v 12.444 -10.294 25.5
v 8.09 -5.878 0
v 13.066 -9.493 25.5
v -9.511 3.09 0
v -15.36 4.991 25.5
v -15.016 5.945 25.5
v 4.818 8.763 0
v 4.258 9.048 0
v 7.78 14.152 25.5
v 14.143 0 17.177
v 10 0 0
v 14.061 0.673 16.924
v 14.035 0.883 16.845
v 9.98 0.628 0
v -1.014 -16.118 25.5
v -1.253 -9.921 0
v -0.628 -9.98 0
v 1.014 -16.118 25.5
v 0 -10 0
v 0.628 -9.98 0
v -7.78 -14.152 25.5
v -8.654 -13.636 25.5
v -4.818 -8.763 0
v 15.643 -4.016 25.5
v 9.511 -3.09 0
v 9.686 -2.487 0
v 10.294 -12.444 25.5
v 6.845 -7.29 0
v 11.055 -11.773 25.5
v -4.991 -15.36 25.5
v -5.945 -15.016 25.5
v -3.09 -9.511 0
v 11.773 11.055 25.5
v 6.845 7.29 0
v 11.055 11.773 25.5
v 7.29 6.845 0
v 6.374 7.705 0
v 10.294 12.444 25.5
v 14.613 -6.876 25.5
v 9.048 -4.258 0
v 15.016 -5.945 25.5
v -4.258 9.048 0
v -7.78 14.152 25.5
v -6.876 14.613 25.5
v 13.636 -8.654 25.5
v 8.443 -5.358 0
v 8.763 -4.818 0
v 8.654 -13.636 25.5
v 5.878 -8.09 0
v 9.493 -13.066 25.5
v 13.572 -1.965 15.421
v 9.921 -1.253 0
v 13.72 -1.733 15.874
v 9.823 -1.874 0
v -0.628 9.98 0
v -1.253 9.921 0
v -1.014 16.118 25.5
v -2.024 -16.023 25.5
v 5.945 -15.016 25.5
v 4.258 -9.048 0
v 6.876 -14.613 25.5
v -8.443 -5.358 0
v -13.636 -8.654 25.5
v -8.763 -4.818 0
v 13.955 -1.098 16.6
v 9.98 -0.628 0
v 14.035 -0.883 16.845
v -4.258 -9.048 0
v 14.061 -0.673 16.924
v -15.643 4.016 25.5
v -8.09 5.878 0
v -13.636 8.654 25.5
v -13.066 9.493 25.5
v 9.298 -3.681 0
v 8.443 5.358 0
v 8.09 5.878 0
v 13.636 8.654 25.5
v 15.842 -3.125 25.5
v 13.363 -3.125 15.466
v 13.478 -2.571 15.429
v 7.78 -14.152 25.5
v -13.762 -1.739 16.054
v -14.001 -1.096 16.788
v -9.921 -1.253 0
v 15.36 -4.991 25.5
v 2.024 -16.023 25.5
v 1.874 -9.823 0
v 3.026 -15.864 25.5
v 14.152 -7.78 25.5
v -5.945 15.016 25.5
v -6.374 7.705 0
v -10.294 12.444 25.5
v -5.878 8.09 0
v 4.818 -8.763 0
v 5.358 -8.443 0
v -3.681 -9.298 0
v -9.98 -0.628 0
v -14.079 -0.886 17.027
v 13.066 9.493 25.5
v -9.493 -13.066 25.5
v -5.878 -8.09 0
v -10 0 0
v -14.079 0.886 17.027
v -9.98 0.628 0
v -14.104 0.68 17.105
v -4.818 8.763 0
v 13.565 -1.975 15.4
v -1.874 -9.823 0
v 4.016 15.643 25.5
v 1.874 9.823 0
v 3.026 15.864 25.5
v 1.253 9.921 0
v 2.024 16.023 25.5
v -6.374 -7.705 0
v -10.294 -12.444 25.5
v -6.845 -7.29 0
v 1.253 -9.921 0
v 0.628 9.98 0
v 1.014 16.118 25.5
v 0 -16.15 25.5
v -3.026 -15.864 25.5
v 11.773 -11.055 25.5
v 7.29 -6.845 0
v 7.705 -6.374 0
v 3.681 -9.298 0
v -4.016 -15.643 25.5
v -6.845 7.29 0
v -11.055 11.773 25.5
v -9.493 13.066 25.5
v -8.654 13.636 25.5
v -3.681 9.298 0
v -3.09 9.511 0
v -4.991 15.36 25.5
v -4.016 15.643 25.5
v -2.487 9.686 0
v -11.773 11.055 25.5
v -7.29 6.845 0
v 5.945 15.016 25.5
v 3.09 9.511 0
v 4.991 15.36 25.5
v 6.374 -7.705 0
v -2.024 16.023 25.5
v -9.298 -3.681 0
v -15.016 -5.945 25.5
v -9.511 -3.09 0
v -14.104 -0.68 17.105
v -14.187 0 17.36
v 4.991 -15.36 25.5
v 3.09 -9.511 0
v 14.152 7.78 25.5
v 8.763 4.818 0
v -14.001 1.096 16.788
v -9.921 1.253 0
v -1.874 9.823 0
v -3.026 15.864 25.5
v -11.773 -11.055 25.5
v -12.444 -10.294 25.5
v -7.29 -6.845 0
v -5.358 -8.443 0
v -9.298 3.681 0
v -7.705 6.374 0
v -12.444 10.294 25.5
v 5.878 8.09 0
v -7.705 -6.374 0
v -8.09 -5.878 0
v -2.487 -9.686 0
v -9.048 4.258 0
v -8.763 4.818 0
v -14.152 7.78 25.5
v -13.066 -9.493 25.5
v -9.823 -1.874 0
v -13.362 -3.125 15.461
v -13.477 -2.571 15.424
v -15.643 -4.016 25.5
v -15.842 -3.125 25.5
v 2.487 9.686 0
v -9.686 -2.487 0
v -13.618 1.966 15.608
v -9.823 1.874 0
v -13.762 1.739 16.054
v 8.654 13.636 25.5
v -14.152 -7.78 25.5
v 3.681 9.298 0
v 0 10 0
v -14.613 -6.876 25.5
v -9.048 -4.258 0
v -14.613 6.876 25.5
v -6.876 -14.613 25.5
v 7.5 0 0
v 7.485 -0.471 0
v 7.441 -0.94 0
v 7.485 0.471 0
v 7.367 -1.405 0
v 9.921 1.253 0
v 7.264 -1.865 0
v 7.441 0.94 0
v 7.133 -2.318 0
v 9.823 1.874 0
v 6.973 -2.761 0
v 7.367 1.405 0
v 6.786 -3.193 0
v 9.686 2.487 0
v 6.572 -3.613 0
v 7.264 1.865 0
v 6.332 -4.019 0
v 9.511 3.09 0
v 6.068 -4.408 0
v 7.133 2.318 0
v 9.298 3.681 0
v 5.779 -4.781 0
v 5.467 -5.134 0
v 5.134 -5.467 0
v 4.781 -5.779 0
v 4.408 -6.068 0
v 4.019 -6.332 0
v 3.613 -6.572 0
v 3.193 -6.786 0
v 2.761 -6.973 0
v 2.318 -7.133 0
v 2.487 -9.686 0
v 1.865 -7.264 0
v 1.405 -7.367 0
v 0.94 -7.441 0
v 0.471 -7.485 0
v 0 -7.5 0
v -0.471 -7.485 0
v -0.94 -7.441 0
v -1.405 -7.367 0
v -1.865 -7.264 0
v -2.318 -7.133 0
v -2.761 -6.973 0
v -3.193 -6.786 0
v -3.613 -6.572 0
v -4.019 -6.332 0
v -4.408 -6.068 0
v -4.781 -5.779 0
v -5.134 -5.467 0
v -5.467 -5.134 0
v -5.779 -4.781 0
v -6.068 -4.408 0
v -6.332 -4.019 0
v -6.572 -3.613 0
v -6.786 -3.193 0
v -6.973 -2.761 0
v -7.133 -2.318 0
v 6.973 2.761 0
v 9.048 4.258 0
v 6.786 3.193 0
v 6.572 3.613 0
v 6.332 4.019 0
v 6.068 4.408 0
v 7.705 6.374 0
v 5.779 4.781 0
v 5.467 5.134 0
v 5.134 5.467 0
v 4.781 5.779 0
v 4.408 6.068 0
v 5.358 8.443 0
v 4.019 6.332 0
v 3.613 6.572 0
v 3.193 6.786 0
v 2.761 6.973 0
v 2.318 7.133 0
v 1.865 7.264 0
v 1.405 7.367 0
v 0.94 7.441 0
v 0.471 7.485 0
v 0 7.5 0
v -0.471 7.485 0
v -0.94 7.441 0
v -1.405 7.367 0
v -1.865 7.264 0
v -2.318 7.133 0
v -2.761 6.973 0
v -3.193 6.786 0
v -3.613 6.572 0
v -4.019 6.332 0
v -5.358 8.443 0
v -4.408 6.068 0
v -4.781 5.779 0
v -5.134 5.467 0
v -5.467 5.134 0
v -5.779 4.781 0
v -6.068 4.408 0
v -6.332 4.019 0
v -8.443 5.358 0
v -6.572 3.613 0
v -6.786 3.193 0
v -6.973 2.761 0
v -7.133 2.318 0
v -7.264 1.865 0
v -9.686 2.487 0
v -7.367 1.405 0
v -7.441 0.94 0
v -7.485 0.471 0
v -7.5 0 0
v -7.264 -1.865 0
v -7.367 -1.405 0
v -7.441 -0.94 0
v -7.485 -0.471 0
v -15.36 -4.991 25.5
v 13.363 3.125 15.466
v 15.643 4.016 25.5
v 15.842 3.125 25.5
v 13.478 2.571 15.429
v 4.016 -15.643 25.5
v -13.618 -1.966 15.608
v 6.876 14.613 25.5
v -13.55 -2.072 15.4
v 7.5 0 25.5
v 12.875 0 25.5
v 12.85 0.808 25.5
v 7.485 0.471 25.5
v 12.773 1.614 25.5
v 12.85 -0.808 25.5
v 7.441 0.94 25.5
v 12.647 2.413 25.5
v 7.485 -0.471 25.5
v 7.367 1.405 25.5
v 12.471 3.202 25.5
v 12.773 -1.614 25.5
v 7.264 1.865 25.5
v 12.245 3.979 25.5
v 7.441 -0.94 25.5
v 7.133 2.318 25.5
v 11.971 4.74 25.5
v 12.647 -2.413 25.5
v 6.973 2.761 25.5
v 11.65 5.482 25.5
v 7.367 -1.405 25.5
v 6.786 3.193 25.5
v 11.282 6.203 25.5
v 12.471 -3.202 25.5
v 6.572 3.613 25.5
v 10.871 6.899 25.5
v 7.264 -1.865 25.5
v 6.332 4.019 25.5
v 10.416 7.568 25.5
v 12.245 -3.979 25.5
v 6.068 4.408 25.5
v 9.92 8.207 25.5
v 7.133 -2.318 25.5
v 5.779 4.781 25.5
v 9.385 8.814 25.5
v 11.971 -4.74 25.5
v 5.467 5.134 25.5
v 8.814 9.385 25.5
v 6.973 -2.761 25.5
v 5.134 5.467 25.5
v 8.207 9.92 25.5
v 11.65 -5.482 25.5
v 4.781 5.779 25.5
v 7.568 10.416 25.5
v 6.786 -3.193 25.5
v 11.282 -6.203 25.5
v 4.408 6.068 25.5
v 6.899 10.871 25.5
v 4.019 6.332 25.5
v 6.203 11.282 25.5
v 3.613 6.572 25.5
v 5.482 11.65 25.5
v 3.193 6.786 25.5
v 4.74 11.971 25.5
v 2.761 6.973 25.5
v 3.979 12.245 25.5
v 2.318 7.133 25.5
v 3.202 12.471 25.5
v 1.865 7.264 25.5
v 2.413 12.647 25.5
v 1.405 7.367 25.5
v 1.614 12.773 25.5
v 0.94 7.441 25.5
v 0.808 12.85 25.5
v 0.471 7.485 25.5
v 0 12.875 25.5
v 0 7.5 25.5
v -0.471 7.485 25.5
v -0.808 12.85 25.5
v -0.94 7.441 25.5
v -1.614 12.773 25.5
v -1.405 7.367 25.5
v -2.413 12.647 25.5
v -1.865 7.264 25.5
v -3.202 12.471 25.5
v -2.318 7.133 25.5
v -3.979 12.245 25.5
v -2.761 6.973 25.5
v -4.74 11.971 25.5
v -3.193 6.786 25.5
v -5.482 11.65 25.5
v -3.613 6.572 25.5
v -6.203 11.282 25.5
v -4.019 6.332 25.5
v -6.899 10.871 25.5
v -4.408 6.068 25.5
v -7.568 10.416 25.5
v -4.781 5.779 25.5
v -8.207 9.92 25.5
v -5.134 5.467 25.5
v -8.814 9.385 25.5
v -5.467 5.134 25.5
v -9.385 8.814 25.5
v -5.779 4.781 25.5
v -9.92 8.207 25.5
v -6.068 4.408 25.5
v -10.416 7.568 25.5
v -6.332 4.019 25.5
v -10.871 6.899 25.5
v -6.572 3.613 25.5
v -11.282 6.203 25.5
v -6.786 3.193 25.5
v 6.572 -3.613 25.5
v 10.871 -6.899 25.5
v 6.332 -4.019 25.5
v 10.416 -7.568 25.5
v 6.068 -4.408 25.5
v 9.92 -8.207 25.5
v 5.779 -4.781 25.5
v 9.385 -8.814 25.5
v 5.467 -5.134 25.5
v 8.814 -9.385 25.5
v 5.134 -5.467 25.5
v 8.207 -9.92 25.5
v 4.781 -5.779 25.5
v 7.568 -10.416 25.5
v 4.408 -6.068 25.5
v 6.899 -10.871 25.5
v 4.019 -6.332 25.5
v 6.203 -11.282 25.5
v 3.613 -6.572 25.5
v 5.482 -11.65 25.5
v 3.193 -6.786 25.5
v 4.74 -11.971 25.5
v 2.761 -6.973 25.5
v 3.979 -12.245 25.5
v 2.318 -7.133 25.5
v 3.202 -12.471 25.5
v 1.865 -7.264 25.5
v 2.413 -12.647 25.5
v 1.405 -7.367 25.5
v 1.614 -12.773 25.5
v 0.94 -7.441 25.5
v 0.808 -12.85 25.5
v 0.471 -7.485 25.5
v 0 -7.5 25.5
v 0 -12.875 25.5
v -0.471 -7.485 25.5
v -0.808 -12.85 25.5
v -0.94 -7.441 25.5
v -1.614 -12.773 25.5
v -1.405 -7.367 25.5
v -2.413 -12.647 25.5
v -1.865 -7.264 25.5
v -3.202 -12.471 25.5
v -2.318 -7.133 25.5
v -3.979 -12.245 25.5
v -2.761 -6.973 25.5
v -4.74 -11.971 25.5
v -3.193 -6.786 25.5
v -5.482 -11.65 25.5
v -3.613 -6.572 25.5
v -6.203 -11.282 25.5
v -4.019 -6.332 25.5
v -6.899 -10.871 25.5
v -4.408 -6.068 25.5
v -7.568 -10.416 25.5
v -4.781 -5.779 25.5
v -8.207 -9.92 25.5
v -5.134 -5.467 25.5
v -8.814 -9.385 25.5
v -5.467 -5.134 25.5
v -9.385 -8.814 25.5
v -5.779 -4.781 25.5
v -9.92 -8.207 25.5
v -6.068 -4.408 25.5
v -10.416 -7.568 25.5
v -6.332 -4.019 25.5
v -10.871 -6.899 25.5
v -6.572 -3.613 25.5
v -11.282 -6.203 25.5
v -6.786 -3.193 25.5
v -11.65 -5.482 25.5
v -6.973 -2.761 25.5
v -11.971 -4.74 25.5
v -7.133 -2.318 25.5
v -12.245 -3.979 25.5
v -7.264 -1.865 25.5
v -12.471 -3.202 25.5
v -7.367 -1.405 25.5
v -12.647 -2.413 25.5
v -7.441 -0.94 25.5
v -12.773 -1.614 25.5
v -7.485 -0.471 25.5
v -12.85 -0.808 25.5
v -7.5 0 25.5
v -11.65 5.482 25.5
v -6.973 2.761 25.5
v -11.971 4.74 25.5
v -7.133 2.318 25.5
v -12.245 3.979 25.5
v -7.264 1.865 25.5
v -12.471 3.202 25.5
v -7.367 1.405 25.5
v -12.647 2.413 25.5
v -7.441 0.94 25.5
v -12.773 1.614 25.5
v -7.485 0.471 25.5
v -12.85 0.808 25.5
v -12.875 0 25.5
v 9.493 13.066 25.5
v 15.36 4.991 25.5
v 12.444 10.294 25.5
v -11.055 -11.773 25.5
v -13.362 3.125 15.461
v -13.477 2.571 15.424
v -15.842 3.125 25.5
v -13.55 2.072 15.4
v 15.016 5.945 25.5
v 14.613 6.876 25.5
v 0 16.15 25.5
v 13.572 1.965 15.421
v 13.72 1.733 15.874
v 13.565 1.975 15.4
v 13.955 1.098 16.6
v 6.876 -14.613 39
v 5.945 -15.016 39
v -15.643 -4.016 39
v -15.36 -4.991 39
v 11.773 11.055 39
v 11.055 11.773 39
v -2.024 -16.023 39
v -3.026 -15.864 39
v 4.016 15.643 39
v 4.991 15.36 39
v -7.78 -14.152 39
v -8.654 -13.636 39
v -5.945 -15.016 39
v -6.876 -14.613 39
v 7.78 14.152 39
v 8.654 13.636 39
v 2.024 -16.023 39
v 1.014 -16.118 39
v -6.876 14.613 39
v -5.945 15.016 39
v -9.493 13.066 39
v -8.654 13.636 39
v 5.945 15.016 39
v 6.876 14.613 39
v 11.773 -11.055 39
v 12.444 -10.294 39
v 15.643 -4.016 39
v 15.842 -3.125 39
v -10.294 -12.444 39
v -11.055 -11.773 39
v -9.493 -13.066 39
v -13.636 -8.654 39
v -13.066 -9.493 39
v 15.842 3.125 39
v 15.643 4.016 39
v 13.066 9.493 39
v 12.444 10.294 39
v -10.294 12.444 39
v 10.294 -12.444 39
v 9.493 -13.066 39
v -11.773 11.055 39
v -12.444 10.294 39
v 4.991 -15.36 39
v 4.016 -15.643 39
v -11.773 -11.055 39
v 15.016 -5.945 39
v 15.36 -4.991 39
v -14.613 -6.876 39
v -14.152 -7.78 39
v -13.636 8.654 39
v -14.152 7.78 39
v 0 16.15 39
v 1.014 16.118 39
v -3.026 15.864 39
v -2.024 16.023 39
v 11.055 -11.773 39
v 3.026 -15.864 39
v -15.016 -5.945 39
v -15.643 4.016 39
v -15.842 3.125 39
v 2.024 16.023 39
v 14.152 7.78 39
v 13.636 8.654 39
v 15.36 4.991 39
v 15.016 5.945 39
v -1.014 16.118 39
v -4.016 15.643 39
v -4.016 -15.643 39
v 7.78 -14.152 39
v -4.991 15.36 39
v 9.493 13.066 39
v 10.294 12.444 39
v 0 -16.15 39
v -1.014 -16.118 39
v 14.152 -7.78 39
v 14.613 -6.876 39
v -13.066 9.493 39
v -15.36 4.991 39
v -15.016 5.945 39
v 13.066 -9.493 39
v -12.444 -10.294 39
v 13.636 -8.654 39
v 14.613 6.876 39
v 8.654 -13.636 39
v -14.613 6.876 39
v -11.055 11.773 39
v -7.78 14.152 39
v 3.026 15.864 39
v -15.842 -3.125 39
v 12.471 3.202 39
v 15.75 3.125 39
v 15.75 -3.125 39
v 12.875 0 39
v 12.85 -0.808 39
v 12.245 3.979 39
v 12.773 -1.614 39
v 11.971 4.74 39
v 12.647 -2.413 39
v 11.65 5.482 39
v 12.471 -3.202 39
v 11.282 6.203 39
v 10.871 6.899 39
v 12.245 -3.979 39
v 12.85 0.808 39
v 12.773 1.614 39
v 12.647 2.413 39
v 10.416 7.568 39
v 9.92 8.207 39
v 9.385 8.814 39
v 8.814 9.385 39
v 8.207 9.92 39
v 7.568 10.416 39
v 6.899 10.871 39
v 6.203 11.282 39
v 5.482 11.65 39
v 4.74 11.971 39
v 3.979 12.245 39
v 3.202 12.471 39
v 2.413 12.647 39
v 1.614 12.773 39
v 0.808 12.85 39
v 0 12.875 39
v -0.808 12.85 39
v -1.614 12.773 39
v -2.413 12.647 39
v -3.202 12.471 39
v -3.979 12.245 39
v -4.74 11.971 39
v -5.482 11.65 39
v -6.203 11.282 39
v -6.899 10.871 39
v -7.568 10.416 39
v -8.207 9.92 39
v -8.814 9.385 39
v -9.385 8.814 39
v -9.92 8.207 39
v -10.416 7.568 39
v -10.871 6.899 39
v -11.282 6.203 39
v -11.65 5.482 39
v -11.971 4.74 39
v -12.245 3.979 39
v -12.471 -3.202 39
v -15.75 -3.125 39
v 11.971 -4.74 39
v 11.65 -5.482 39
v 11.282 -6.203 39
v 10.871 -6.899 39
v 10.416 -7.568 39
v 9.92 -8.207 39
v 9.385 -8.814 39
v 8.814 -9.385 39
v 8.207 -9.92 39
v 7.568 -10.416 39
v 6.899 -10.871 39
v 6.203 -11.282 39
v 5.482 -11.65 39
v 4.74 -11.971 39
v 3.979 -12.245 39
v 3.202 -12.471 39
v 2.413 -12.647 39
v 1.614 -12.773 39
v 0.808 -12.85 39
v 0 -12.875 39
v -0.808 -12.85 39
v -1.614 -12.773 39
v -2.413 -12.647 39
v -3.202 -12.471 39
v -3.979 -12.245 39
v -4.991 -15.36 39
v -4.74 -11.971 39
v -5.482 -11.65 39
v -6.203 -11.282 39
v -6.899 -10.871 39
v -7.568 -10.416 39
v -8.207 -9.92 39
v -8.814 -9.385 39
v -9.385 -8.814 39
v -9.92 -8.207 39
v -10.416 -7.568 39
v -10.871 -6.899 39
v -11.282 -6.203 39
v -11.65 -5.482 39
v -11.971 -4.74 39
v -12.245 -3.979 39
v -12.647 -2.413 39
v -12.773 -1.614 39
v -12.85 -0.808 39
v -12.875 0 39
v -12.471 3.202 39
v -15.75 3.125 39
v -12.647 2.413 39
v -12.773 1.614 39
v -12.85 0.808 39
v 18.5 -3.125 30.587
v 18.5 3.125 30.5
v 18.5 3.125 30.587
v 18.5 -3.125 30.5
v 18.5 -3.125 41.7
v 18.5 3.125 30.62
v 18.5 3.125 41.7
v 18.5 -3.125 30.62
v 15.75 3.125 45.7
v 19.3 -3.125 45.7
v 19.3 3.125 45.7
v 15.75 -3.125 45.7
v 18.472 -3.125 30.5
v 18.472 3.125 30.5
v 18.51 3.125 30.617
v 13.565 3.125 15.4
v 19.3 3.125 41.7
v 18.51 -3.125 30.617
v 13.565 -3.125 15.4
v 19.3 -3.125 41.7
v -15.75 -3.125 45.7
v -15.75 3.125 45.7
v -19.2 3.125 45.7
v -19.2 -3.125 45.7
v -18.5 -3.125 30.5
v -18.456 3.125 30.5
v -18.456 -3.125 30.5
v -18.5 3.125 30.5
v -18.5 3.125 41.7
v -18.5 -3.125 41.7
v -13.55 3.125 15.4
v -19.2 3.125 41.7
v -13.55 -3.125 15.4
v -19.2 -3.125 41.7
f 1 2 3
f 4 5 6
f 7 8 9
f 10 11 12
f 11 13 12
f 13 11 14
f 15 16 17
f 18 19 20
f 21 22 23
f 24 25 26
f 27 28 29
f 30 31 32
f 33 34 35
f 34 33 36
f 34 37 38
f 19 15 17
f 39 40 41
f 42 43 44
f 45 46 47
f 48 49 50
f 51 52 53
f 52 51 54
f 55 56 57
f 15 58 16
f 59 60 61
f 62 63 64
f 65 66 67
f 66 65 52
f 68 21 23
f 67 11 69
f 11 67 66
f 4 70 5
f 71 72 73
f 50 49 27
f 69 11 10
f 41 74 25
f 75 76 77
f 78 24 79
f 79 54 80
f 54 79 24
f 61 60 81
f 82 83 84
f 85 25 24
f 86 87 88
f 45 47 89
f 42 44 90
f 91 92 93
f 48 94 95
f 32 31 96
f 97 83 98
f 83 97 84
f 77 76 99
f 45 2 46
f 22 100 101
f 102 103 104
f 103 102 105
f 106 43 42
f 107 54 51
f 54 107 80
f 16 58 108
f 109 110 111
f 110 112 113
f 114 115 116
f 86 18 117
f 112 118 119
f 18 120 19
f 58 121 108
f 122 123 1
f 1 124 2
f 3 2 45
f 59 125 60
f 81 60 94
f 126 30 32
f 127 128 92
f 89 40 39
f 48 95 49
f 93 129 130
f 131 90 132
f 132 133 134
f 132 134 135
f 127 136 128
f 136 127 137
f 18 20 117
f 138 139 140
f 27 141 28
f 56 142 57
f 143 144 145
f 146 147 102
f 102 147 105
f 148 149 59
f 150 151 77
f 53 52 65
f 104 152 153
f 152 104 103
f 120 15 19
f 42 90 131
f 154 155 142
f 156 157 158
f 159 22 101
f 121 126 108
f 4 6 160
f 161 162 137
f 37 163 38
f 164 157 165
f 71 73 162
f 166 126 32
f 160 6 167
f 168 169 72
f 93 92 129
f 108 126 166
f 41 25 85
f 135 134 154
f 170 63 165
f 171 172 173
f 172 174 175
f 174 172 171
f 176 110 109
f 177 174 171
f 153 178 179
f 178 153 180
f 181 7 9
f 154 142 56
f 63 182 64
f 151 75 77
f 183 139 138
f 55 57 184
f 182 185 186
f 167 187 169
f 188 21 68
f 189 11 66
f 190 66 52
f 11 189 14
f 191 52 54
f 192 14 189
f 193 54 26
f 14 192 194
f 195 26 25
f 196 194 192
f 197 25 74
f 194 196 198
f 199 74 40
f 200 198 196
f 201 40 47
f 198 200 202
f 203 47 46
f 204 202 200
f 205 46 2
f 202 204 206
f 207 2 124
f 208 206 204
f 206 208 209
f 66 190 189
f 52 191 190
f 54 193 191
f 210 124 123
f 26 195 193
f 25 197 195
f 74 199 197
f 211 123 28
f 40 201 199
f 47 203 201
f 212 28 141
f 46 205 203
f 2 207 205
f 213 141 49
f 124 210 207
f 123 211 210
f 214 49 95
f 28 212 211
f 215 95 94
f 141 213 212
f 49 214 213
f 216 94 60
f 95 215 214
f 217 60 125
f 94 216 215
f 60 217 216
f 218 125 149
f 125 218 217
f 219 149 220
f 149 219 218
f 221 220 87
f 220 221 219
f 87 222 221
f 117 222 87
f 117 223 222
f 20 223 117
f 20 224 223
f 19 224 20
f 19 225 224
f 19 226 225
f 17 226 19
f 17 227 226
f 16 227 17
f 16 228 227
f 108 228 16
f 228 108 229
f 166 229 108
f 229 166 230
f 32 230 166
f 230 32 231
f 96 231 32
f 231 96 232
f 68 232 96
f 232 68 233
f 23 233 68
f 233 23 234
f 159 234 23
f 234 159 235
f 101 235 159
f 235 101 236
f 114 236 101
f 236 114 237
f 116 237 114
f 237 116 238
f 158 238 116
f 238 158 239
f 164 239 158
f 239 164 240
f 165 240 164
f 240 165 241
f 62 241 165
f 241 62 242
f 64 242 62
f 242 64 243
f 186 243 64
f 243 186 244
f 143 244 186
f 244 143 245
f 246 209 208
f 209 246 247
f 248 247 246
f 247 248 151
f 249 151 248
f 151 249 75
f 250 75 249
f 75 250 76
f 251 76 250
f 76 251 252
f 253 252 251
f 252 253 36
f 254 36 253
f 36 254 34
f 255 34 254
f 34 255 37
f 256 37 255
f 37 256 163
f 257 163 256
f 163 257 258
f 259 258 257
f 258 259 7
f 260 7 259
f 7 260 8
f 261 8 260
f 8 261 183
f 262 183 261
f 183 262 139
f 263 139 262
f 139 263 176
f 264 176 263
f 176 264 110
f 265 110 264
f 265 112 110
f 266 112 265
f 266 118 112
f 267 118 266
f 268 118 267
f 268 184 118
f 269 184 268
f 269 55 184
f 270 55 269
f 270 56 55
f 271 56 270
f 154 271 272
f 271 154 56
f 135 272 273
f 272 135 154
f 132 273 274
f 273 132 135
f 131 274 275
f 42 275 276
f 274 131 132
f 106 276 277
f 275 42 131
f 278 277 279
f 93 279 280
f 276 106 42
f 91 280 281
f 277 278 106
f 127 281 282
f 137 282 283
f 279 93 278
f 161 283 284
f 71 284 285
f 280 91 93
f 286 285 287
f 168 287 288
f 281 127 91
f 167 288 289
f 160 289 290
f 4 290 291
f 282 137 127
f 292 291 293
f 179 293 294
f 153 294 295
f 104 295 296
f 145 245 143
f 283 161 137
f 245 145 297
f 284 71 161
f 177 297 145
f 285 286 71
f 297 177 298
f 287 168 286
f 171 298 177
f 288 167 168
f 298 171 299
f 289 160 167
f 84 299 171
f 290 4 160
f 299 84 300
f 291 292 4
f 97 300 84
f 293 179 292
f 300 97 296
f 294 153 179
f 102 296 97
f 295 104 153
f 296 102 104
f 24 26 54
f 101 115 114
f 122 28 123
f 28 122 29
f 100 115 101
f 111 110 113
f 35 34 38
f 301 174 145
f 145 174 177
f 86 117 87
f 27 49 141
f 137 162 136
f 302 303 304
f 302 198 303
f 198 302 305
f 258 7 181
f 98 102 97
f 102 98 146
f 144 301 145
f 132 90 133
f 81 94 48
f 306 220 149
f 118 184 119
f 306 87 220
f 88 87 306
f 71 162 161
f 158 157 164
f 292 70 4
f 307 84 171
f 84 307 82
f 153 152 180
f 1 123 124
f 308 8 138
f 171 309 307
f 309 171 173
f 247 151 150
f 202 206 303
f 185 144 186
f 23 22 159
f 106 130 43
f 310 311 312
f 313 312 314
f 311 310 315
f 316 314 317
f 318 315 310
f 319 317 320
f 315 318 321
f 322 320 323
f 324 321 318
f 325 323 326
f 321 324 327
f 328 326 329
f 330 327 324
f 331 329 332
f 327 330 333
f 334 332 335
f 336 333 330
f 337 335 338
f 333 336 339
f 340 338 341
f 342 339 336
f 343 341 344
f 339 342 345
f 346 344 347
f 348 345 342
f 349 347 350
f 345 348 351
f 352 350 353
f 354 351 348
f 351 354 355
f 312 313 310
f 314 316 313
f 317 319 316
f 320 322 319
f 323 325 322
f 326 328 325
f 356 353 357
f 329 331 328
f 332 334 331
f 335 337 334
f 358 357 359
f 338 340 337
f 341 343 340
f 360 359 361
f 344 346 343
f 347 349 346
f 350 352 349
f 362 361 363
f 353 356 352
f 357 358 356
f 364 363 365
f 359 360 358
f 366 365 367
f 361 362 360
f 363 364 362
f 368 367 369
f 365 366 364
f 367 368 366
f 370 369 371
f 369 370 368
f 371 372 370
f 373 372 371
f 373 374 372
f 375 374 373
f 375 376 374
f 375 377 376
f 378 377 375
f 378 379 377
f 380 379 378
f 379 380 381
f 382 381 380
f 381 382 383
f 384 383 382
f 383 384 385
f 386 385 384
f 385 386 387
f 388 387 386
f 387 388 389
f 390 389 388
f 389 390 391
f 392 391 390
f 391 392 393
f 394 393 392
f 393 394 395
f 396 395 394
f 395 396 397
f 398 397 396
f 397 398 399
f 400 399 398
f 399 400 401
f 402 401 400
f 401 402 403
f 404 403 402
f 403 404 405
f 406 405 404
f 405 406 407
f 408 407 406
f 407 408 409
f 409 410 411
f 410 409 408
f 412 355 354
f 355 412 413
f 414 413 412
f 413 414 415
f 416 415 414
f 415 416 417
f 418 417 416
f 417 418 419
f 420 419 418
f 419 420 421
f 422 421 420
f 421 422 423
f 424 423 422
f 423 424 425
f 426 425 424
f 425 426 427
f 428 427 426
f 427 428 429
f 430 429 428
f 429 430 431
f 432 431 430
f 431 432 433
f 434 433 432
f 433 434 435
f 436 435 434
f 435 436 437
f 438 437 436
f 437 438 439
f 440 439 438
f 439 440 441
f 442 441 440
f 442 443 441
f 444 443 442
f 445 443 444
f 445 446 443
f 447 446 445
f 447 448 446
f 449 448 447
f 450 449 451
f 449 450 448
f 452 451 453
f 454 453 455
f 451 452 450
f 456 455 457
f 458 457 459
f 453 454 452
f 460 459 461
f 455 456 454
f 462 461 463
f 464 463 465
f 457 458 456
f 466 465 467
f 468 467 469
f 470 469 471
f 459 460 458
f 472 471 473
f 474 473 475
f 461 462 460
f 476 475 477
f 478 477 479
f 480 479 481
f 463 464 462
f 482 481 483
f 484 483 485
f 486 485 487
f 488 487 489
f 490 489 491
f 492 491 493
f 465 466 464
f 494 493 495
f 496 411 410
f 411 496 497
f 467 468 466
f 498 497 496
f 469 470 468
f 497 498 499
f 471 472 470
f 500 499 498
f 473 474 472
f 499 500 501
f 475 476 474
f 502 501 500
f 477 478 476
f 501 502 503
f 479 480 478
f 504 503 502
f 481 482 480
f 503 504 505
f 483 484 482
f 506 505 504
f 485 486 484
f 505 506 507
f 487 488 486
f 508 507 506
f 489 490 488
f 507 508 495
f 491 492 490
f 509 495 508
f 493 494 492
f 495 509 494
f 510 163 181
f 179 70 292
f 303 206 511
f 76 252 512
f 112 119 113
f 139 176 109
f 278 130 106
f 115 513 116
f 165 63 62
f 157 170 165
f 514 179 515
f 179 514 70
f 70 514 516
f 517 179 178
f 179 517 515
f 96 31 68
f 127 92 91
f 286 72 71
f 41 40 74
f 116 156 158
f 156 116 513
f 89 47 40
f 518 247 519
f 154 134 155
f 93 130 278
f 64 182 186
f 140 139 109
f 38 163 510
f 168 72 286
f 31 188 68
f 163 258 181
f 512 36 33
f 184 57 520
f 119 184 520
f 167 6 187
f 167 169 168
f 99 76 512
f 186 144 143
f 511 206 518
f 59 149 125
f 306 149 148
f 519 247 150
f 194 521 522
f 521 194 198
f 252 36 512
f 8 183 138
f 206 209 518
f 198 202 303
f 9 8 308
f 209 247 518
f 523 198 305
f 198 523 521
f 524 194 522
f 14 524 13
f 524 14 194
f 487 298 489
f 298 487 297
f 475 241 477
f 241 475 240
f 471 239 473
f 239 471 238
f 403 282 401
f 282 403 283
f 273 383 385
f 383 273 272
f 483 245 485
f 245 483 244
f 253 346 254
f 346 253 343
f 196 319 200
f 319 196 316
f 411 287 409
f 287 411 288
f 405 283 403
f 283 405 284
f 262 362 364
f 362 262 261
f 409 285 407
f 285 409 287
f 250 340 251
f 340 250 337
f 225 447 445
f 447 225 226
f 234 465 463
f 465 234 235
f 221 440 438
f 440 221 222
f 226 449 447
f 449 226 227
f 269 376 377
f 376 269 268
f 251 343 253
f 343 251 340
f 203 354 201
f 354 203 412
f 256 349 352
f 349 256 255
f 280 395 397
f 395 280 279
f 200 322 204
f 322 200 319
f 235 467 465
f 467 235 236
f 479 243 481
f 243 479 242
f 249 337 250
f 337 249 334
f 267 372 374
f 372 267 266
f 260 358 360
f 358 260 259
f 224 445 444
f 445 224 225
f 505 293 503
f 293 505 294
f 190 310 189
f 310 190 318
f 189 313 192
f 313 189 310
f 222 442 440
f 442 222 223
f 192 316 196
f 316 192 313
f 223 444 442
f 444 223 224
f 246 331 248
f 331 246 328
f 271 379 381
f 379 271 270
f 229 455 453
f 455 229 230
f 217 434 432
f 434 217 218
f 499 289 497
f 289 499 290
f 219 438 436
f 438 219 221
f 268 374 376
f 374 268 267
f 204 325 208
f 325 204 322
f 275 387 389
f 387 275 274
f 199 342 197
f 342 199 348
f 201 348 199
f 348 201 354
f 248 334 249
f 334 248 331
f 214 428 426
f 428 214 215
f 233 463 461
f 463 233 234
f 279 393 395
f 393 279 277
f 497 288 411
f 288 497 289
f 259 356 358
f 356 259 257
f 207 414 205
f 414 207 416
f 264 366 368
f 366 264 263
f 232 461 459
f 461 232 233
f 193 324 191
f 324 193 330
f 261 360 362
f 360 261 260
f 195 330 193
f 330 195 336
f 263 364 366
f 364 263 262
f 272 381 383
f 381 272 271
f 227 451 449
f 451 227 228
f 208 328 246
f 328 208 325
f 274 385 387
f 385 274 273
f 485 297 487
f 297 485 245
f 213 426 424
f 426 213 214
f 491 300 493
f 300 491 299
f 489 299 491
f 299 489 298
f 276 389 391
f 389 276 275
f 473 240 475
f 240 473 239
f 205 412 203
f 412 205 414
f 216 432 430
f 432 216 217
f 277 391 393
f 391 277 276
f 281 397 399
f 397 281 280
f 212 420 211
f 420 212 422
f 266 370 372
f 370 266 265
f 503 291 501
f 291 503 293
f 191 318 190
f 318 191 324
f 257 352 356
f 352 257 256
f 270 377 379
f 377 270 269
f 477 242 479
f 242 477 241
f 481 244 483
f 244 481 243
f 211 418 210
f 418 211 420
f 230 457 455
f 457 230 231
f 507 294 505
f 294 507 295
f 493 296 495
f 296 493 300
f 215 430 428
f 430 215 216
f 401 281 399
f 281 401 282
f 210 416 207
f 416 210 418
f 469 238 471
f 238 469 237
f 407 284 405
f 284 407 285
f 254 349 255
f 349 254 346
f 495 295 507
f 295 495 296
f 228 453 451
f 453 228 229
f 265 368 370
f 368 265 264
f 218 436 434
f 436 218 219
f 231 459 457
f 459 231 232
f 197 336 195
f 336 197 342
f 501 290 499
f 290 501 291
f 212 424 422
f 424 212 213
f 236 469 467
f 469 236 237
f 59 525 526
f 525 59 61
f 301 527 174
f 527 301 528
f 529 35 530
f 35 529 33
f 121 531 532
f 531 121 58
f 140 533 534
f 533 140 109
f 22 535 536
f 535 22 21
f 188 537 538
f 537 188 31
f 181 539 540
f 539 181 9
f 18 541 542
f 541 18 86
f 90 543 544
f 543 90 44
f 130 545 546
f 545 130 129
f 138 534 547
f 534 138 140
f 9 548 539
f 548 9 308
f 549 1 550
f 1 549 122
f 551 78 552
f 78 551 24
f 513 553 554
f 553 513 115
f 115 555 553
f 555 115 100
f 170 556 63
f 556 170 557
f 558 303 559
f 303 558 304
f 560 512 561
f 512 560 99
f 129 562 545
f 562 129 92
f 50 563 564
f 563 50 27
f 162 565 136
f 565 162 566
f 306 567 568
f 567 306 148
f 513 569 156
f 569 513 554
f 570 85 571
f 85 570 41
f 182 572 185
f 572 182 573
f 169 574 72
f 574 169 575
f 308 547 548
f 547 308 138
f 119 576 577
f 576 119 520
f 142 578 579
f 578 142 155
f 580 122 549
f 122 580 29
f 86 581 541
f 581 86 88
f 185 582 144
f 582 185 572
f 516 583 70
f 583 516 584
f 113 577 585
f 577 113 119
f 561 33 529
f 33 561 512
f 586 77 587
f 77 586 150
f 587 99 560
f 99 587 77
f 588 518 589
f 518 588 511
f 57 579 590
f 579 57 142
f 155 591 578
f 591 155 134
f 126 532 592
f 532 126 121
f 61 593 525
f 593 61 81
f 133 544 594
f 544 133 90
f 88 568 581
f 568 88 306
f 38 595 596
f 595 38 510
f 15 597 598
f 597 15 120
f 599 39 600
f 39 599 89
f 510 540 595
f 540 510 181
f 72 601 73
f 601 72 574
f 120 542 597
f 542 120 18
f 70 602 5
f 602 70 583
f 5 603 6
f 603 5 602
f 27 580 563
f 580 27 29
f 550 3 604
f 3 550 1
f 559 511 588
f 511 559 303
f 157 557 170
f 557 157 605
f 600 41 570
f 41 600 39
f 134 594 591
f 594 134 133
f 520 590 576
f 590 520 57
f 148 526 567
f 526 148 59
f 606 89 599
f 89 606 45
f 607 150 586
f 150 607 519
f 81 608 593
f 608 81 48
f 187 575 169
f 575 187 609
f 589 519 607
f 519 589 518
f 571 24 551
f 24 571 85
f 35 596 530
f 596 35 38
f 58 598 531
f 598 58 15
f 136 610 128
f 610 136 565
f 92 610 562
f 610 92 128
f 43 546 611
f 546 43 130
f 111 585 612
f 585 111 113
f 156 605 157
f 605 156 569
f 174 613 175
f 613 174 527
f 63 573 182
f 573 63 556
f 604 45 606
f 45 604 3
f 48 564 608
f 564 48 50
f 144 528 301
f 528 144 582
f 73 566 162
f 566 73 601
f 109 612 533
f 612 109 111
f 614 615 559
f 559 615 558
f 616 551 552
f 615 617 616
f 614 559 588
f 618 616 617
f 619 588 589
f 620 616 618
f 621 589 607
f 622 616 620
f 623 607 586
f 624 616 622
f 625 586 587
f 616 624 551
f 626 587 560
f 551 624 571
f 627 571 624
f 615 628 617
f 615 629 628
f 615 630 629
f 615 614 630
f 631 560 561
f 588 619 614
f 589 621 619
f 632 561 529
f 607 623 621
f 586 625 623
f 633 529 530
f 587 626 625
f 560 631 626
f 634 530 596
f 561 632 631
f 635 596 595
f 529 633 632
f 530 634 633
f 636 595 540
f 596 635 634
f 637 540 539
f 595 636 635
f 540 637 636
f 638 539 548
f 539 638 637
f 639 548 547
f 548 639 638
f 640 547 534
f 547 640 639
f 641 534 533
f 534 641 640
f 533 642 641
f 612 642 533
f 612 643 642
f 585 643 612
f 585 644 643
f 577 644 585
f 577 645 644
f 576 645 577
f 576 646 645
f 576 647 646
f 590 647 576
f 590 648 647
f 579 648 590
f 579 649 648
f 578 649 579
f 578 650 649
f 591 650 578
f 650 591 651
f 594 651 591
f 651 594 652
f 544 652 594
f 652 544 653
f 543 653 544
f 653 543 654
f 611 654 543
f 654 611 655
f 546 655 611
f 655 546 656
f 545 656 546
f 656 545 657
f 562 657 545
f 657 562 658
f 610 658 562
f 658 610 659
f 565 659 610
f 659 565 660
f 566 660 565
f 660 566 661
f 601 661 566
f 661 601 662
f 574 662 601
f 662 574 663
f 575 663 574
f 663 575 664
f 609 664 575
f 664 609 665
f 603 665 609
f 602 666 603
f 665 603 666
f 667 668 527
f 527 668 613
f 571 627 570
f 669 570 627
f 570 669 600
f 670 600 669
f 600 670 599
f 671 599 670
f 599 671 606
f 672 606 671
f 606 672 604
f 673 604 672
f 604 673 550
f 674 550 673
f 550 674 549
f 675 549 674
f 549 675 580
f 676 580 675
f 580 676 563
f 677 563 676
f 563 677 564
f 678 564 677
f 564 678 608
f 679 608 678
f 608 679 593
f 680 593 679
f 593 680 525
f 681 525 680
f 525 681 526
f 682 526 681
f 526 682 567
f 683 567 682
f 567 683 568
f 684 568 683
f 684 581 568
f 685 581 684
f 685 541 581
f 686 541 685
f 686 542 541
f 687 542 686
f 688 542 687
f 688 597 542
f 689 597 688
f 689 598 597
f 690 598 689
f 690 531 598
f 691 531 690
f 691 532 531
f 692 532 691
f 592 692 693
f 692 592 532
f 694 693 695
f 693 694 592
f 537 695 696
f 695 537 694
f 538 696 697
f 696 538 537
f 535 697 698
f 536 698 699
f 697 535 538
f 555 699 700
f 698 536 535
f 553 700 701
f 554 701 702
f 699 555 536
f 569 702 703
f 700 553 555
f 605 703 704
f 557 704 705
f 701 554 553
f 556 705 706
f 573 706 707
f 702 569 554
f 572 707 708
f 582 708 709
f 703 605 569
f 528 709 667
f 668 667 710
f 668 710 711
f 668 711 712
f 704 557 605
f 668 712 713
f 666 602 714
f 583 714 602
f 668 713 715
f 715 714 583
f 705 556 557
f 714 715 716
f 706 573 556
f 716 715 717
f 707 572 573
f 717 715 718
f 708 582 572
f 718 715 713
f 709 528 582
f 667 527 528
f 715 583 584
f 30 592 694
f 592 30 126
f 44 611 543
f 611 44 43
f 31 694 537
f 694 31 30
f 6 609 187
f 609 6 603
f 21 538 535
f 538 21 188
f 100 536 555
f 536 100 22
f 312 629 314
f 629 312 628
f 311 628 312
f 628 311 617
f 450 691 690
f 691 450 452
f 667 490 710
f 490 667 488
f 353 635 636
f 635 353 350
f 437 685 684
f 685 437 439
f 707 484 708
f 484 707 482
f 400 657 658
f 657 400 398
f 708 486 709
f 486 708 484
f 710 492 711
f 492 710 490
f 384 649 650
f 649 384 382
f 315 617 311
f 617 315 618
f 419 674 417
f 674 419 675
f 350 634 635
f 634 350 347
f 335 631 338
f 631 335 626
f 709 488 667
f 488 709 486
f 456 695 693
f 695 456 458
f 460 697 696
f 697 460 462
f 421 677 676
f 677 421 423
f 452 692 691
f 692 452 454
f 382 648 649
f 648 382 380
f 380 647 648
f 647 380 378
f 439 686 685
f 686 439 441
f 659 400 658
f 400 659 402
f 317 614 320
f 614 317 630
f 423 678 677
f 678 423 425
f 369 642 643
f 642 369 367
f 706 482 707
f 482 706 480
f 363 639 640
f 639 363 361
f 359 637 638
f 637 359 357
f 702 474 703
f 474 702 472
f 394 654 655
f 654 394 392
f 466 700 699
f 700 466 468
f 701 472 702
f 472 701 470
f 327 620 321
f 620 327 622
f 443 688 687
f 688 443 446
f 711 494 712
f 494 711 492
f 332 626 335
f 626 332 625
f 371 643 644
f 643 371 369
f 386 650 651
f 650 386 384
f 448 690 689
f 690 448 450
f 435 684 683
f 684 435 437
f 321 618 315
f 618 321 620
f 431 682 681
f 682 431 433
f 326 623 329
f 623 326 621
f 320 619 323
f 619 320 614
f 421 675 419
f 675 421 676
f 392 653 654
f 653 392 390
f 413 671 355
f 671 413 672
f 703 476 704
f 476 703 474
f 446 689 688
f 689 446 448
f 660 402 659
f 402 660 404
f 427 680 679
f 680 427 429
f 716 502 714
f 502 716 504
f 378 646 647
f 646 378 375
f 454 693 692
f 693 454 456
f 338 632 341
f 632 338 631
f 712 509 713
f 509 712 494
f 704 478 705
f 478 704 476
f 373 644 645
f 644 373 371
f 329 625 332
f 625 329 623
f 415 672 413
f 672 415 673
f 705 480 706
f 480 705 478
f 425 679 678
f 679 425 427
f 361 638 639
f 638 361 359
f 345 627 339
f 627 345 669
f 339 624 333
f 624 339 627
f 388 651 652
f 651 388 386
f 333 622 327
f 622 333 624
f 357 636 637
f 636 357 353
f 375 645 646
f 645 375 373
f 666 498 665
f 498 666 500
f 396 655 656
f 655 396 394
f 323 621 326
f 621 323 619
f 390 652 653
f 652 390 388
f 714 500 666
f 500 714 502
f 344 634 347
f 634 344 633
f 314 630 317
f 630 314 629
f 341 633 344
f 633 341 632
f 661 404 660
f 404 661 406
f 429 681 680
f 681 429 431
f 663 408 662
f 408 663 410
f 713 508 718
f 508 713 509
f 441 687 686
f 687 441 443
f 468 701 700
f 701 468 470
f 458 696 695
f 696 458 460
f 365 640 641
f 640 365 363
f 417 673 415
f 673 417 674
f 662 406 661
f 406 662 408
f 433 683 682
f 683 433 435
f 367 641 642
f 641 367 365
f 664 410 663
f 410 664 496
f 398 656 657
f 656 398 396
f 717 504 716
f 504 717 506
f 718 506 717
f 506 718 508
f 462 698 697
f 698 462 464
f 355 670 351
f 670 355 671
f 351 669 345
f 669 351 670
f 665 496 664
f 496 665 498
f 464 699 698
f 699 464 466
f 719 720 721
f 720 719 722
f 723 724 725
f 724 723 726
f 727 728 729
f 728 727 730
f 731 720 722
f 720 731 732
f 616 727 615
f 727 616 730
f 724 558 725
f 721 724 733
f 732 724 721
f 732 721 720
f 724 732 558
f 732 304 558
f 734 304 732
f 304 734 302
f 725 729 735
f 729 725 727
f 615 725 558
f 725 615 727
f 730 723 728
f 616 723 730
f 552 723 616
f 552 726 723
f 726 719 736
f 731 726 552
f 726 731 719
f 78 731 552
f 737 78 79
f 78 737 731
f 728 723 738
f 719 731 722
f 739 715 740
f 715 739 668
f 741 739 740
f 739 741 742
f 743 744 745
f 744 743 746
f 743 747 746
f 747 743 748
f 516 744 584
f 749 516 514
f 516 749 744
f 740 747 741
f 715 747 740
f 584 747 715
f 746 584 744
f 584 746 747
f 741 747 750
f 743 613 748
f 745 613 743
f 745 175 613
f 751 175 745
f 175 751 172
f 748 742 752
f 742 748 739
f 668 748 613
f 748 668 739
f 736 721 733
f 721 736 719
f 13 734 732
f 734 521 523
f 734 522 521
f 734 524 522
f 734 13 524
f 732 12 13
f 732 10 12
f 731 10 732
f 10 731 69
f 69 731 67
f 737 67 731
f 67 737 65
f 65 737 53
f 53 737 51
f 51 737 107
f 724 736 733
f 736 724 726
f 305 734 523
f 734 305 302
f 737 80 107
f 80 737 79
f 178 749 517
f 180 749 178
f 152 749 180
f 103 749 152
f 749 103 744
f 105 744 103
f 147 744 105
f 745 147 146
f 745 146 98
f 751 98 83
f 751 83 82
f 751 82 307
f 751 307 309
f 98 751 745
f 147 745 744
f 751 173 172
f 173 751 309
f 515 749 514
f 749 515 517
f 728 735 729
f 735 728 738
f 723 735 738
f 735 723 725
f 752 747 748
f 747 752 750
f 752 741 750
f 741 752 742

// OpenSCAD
$fn=100;
difference(){
    cylinder(25.5,10,16.15);
    cylinder(25.5,7.5,7.5);
}
translate([0,0,25.5])difference(){
    cylinder(13.5,16.15,16.15);
    cylinder(13.5,12.875,12.875);
    //translate([0,0,5])cylinder(8.5,12.875,12.875);
}
translate([15.75,-3.125,30.5])cube([2.75,6.25,15.2]);
translate([-18.5,-3.125,30.5])cube([2.75,6.25,15.2]);
translate([10.95,-3.125,16.25])rotate([0,18,0])cube([2.75,6.25,16]);
translate([-13.55,-3.125,15.4])rotate([0,-18,0])cube([2.75,6.25,16]);
translate([18.3,-3.125,41.7])cube([1,6.25,4]);
translate([-19.2,-3.125,41.7])cube([1,6.25,4]);
